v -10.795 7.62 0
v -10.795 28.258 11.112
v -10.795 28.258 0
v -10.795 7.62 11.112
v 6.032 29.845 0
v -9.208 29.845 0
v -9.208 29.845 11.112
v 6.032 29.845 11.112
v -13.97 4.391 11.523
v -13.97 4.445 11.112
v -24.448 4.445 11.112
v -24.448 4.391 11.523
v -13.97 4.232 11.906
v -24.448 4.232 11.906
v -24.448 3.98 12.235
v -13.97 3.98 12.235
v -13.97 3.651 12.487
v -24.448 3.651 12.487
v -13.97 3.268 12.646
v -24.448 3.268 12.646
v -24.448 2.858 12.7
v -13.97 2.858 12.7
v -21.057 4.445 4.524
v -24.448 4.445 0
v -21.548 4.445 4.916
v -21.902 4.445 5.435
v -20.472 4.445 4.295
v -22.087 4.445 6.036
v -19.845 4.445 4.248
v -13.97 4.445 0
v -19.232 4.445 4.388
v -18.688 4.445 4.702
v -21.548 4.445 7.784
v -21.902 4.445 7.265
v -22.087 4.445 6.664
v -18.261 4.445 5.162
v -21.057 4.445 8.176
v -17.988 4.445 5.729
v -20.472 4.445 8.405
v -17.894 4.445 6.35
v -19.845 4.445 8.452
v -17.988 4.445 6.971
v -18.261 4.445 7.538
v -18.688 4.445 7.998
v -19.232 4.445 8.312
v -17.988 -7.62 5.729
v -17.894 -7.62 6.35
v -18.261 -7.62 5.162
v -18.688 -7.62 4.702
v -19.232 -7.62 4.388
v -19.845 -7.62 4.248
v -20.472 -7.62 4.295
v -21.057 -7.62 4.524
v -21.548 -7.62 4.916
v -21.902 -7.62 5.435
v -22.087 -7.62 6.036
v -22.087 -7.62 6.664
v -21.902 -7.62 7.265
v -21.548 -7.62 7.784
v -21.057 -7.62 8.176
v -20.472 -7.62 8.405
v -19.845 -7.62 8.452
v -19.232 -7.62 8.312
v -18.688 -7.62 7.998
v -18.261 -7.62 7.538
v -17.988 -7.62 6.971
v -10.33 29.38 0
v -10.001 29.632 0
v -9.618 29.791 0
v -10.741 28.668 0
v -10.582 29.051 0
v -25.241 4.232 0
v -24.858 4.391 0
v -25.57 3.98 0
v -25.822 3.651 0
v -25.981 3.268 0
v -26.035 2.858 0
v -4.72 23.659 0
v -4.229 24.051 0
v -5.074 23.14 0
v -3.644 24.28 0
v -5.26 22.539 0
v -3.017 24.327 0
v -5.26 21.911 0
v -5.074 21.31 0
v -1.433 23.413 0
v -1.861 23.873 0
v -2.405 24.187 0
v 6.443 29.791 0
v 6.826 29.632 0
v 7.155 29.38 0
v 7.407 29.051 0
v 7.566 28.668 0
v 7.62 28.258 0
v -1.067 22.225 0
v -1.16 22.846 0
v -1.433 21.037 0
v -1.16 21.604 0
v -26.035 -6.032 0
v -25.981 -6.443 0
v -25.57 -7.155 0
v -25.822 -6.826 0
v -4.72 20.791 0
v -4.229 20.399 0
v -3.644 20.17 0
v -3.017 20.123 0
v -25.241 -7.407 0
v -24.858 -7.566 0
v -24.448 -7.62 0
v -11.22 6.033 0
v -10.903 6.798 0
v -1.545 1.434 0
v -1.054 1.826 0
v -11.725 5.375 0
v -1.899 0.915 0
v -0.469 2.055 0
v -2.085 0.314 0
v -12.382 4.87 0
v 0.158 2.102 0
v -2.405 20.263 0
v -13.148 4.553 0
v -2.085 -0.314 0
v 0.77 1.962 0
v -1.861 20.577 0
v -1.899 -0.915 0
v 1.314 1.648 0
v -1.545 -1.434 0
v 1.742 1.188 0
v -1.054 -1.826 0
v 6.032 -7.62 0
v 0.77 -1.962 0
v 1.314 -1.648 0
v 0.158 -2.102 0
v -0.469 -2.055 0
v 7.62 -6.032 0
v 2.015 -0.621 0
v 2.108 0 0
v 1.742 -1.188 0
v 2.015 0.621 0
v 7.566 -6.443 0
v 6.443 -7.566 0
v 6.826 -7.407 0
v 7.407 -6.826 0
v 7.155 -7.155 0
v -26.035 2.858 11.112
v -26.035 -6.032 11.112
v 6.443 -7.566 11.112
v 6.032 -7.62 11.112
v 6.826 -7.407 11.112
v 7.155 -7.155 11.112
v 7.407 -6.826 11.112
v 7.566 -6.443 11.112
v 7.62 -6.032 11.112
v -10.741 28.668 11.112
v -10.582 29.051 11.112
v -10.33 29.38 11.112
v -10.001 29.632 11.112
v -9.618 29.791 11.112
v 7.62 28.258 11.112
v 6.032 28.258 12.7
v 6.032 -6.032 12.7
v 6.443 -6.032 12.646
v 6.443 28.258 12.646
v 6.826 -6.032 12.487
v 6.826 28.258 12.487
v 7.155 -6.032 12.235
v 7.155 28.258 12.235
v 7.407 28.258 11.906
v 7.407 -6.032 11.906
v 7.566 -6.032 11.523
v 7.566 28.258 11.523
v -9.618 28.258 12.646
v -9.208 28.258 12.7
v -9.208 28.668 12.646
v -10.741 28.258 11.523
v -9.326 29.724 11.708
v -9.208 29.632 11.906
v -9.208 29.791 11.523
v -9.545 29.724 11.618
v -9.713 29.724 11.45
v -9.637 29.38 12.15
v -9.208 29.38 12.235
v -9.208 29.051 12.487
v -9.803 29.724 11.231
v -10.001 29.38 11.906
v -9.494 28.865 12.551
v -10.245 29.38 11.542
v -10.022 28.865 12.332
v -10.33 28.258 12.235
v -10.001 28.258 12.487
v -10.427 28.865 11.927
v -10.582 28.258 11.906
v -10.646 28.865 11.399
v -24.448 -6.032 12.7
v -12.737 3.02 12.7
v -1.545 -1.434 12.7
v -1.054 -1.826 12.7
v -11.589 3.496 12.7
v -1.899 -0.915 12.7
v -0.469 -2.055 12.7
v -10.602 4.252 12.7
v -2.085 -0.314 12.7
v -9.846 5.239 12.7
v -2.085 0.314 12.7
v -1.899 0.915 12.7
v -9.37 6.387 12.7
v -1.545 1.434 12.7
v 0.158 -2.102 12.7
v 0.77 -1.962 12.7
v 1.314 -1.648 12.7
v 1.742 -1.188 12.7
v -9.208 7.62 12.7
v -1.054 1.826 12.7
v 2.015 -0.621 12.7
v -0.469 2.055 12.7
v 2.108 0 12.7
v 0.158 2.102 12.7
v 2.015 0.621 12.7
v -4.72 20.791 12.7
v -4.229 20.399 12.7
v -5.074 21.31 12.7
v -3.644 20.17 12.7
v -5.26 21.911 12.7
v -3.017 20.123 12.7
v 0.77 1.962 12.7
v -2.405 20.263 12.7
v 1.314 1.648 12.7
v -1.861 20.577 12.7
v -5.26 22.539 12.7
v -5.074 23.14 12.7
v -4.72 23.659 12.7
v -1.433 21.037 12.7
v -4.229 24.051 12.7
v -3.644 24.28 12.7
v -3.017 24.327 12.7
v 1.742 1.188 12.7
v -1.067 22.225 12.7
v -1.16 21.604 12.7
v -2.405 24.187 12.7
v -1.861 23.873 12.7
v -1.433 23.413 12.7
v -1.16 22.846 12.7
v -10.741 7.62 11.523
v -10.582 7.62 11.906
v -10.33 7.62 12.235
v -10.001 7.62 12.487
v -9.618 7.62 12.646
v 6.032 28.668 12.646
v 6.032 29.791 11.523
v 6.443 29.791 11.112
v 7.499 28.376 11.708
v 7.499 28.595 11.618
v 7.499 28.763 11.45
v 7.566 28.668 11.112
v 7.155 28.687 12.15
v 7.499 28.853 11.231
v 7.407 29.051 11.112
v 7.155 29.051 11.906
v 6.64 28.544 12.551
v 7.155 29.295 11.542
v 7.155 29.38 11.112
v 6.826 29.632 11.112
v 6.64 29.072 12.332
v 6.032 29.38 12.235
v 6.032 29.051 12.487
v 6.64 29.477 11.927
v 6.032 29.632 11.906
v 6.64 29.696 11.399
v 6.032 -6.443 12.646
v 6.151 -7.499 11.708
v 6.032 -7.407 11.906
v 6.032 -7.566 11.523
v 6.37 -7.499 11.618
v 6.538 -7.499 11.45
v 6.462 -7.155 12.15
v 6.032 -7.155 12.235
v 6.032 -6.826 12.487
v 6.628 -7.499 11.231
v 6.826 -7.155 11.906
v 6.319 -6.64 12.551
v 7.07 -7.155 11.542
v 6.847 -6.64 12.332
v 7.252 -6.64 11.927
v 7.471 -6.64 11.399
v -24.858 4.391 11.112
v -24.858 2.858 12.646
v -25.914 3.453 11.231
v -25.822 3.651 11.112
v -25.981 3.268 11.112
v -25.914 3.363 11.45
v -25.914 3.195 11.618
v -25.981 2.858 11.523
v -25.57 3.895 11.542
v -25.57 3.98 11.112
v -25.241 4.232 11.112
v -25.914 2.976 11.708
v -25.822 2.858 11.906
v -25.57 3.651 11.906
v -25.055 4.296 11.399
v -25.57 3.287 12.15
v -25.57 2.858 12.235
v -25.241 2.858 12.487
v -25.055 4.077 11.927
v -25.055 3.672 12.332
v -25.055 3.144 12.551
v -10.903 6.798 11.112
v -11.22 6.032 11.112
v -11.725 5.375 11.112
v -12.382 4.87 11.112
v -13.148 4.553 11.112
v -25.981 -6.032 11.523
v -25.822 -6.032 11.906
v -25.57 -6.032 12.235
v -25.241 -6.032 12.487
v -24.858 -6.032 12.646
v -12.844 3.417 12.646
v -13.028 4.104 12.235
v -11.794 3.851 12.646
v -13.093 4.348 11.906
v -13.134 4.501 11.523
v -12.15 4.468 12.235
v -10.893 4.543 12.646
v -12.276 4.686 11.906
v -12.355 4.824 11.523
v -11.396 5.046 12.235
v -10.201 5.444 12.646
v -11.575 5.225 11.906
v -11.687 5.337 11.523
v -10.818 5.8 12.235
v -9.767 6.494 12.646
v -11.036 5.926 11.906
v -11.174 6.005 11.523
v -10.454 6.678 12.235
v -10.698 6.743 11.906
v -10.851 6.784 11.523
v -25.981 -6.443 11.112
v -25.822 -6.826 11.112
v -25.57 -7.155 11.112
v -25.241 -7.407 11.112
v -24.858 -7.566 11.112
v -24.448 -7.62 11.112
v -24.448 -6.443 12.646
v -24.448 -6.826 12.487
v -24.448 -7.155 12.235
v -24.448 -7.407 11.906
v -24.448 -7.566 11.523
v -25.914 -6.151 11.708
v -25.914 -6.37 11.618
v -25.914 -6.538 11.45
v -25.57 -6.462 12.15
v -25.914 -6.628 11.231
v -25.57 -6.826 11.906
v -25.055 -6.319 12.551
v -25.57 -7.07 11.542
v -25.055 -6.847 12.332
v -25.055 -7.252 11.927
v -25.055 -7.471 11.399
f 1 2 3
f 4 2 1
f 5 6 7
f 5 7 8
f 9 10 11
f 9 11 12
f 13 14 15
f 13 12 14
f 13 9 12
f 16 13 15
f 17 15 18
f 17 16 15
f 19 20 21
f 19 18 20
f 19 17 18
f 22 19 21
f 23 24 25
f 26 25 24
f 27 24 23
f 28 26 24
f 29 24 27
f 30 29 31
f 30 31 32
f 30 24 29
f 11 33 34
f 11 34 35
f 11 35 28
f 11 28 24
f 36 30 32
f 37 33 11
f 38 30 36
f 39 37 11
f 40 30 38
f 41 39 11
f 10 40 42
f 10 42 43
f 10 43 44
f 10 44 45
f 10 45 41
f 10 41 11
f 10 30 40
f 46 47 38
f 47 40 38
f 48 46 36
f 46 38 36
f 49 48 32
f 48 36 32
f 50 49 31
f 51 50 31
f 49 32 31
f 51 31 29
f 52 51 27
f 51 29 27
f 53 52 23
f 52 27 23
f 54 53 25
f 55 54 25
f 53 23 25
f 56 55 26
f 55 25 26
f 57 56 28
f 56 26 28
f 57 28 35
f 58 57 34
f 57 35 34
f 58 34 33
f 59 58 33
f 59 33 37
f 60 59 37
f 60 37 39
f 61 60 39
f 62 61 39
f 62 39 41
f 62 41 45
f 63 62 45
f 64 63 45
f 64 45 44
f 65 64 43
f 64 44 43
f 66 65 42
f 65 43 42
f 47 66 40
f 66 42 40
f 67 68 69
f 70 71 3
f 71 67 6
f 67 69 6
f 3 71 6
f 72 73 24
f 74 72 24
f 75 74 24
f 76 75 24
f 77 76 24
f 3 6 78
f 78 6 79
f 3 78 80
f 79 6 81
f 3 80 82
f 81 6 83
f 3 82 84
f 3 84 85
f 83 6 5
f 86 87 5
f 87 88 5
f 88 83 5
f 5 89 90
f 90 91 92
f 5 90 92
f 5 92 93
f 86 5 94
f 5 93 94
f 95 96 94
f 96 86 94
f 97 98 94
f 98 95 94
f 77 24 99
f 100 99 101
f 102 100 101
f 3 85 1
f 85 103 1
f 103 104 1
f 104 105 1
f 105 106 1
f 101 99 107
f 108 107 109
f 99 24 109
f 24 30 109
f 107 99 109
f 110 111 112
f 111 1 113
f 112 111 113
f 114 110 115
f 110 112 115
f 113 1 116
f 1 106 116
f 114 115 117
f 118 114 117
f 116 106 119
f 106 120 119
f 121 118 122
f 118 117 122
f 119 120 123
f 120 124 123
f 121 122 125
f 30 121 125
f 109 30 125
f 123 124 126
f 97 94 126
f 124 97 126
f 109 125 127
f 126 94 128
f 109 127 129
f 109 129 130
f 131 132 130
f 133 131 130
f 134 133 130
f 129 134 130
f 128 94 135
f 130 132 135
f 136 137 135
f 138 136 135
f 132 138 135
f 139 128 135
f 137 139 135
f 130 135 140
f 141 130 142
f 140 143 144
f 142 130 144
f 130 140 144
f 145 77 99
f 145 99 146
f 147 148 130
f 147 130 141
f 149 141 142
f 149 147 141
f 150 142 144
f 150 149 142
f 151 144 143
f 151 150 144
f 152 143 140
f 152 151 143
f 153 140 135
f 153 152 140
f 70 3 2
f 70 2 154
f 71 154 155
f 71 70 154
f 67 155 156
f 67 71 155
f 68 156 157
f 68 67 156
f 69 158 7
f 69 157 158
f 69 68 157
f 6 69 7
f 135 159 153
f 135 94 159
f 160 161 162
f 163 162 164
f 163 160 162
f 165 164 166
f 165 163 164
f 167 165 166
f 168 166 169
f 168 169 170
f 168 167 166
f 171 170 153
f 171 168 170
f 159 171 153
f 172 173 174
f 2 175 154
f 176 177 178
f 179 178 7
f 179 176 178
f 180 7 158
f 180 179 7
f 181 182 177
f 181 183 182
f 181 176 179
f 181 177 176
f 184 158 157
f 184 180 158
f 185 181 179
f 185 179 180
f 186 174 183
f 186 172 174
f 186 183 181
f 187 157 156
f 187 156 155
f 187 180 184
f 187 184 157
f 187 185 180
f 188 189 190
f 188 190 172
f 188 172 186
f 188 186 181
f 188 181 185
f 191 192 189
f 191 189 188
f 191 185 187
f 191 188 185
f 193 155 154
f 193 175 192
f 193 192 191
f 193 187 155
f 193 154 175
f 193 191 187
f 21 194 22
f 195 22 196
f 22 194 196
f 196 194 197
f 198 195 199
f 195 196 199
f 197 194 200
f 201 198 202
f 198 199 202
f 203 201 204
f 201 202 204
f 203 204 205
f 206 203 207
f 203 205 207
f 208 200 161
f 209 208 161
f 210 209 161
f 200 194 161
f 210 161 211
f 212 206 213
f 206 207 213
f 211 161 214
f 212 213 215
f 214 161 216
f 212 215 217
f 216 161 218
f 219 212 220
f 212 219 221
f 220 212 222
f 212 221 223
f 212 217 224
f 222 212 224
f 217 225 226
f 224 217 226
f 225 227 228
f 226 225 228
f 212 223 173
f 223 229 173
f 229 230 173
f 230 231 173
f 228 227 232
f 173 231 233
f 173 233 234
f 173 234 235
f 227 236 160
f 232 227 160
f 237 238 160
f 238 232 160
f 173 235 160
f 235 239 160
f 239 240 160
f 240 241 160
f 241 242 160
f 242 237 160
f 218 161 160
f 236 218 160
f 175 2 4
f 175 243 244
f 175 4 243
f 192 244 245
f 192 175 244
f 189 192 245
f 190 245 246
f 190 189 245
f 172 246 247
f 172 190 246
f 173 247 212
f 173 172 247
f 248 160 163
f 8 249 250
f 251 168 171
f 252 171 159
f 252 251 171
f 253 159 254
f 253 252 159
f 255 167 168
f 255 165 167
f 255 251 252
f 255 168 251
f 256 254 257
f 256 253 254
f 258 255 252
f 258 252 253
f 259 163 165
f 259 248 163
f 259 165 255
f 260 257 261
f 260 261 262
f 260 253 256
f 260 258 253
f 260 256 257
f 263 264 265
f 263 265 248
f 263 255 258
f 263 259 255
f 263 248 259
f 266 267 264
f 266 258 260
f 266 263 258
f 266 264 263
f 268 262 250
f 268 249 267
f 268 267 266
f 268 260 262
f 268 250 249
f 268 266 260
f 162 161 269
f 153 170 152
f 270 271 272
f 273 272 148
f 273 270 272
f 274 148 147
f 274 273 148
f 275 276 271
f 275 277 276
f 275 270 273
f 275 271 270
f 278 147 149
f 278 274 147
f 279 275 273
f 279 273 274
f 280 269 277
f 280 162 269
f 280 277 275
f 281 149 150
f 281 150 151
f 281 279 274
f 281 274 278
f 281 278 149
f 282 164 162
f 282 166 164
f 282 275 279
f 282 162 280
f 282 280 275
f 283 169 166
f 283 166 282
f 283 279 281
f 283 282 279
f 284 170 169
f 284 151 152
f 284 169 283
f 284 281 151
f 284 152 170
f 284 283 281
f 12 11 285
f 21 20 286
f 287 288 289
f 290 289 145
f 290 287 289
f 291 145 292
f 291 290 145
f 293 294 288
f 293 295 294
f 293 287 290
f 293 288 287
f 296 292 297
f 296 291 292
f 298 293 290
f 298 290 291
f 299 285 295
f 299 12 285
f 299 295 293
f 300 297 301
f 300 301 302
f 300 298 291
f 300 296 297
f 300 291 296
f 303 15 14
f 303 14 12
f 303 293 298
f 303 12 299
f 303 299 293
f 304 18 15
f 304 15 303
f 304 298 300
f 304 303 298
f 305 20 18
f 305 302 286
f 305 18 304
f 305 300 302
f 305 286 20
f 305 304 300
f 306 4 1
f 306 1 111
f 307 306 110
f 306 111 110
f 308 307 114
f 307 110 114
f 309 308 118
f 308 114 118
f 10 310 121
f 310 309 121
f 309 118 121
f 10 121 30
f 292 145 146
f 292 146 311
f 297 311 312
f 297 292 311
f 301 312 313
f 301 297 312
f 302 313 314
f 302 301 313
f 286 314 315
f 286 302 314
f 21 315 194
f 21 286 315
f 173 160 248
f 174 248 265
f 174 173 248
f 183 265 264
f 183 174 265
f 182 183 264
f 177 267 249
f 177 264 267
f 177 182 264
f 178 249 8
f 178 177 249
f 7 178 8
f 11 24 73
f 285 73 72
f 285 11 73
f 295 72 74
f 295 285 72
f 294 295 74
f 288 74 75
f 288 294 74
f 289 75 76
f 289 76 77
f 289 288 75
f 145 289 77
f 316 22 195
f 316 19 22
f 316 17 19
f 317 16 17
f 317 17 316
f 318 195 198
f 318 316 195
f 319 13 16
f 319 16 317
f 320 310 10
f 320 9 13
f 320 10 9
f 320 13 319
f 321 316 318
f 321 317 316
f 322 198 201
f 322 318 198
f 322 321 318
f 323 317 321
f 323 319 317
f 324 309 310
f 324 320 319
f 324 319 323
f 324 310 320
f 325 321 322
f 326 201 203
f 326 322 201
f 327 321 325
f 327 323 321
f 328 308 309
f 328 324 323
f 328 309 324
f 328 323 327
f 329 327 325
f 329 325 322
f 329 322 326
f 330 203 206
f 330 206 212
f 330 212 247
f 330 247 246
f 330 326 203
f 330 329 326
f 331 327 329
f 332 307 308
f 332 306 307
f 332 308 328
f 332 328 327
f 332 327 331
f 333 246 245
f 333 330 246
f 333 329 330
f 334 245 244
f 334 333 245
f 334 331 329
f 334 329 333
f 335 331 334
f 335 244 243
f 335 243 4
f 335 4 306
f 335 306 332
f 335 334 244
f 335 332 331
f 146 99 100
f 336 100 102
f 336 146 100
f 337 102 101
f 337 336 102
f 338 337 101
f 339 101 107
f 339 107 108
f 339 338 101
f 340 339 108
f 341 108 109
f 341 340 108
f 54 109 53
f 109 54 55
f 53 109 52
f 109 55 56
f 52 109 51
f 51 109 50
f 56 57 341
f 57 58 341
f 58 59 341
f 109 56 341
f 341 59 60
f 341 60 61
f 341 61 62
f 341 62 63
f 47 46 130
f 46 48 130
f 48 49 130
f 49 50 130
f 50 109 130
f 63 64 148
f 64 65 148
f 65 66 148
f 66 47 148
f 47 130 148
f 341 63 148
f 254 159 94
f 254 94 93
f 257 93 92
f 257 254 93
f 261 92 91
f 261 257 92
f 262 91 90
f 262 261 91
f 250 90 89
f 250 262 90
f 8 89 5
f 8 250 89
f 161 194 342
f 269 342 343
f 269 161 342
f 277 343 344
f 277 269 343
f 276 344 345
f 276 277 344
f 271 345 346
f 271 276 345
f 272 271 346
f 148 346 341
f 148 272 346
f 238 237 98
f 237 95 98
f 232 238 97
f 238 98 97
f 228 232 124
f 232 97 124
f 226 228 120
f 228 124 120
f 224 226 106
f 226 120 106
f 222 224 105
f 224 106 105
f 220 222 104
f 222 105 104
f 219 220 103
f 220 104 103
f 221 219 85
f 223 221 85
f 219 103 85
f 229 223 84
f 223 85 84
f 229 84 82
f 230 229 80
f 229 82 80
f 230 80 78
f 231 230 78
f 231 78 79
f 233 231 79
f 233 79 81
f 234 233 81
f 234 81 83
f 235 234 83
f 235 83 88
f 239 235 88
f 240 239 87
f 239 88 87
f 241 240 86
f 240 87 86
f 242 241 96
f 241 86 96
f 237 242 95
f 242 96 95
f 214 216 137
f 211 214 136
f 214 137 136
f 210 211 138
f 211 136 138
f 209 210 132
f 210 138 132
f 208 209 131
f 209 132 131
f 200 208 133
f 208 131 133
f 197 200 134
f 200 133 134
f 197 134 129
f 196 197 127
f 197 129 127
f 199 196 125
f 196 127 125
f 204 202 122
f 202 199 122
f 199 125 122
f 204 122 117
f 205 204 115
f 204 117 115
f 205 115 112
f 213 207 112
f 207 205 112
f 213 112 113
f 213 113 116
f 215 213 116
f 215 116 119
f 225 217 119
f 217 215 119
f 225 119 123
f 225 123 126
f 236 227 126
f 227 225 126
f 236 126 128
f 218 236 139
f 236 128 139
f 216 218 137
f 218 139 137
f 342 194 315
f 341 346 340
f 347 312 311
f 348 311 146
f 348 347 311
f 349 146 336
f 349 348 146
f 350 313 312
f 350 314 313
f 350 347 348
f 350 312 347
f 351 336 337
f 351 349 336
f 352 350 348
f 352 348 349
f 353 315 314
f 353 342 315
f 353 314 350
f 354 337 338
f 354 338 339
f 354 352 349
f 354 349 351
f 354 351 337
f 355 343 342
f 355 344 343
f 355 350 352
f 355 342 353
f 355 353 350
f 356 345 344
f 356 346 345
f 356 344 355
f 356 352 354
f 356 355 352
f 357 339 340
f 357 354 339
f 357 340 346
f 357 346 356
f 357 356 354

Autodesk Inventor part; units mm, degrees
ref_plane "YZ Plane" through (0, 0, 0) normal (1, 0, 0) x (0, 1, 0)
ref_plane "XZ Plane" through (0, 0, 0) normal (0, 1, 0) x (-1, 0, 0)
ref_plane "XY Plane" through (0, 0, 0) normal (0, 0, 1) x (1, 0, 0)
sketch "Sketch1" plane through (0, 0, 0) normal (0, 0, 1) x (1, 0, 0)
  line L0 (0, 0) -> (0, 22.225)
  line L1 (0, 22.225) -> (-3.175, 22.225)
  circle A0 centre (-3.175, 22.225) radius 2.1082
  circle A1 centre (0, 0) radius 2.1082
  line L2 (0, 0) -> (7.62, 0)
  line L3 (7.62, 0) -> (7.62, -7.62)
  line L4 (7.62, -7.62) -> (0, -7.62)
  line L5 (0, -7.62) -> (0, 0)
  line L6 (-3.175, 22.225) -> (-13.335, 22.225)
  line L7 (-13.335, 22.225) -> (-13.335, 29.845)
  line L8 (-13.335, 29.845) -> (-3.175, 29.845)
  line L9 (-3.175, 29.845) -> (-3.175, 22.225)
  line L10 (-13.335, 29.845) -> (7.62, 29.845)
  line L11 (7.62, 29.845) -> (7.62, -7.62)
  line L12 (7.62, -7.62) -> (-13.335, -7.62)
  line L13 (-13.335, -7.62) -> (-13.335, 29.845)
  line L14 (-13.335, 29.845) -> (-20.955, 29.845)
  line L15 (-20.955, 29.845) -> (-20.955, -7.62)
  line L16 (-20.955, -7.62) -> (-13.335, -7.62)
  line L17 (-13.335, -7.62) -> (-13.335, 29.845)
  point P0 (-3.175, 29.845)
  point P1 (-13.335, -7.62)
  dimension "d0" = 22.225
  dimension "d1" = 3.175
  dimension "d2" = 4.2164
  dimension "d3" = 4.2164
  dimension "d4" = 7.62
  dimension "d5" = 7.62
  dimension "d6" = 10.16
  dimension "d7" = 7.62
  dimension "d8" = 7.62
extrude "Extrusion1" add sketch "Sketch1" along normal blind 12.7 contours A1 L5 L12 L13 L6 A0 L1 L0 | L0 L1 A0 L9 L10 L11 L2 A1 | L2 L3 L4 L5 A1 | L16 L15 L14 L7 L13 | A0 L6 L7 L8 L9
sketch "Sketch2" plane through (0, 0, 12.7) normal (0, 0, 1) x (1, 0, 0)
  line L0 (-20.955, 29.845) -> (-20.955, -7.62) projected
  line L1 (-20.955, 29.845) -> (-10.795, 29.845)
  line L2 (-10.795, 29.845) -> (-10.795, 4.445)
  line L3 (-10.795, 4.445) -> (-20.955, 4.445)
  line L4 (-20.955, 4.445) -> (-20.955, 29.845)
  point P0 (0, 0)
  point P1 (-20.955, 4.445)
  dimension "d11" = 10.16
  dimension "d12" = 25.4
extrude "Extrusion2" cut sketch "Sketch2" against normal blind 31.75
fillet "Fillet1" radius 3.175 1 edges at (-10.795, 4.445, 6.35)
sketch "Sketch3" plane through (-20.955, -7.62, 0) normal (-1, 0, 0) x (0, 0, 1)
  point P0 (0, 7.62)
sketch "Sketch4" plane through (-20.955, -7.62, 0) normal (-1, 0, 0) x (0, 0, 1)
  line L0 (0, 12.065) -> (0, 0) projected
  line L1 (0, 12.065) -> (12.7, 12.065) projected
  line L2 (0, 0) -> (12.7, 0)
  line L3 (12.7, 0) -> (12.7, 12.065)
  line L4 (12.7, 12.065) -> (0, 12.065)
  line L5 (0, 12.065) -> (0, 0)
  point P0 (0, 7.62)
extrude "Extrusion3" add sketch "Sketch4" along normal blind 5.08
sketch "Sketch5" plane through (-13.97, 4.445, 12.7) normal (0, 1, 0) x (1, 0, 0)
  line L0 (-12.065, 0) -> (-12.065, 12.7) projected
  line L1 (0, 0) -> (-12.065, 0) projected
  line L2 (-12.065, 12.7) -> (0, 0)
  circle A0 centre (-6.0325, 6.35) radius 2.1082
  point P0 (13.97, 12.7)
  dimension "d18" = 4.2164
extrude "Extrusion4" cut sketch "Sketch5" against normal blind 20.32 contours A0 L2 | L2 A0
fillet "Fillet2" radius 1.5875 12 edges at (-11.7249, 5.3749, 12.7) (-10.795, 18.7325, 12.7) (-20.0025, 4.445, 12.7) (-10.795, 29.845, 6.35) (-1.5875, 29.845, 12.7) (7.62, 29.845, 6.35) (7.62, 11.1125, 12.7) (-9.2075, -7.62, 12.7) (-26.035, -1.5875, 12.7) (-26.035, -7.62, 6.35) (-26.035, 4.445, 6.35) (7.62, -7.62, 6.35)
properties part number "wing arm mount (left)"
